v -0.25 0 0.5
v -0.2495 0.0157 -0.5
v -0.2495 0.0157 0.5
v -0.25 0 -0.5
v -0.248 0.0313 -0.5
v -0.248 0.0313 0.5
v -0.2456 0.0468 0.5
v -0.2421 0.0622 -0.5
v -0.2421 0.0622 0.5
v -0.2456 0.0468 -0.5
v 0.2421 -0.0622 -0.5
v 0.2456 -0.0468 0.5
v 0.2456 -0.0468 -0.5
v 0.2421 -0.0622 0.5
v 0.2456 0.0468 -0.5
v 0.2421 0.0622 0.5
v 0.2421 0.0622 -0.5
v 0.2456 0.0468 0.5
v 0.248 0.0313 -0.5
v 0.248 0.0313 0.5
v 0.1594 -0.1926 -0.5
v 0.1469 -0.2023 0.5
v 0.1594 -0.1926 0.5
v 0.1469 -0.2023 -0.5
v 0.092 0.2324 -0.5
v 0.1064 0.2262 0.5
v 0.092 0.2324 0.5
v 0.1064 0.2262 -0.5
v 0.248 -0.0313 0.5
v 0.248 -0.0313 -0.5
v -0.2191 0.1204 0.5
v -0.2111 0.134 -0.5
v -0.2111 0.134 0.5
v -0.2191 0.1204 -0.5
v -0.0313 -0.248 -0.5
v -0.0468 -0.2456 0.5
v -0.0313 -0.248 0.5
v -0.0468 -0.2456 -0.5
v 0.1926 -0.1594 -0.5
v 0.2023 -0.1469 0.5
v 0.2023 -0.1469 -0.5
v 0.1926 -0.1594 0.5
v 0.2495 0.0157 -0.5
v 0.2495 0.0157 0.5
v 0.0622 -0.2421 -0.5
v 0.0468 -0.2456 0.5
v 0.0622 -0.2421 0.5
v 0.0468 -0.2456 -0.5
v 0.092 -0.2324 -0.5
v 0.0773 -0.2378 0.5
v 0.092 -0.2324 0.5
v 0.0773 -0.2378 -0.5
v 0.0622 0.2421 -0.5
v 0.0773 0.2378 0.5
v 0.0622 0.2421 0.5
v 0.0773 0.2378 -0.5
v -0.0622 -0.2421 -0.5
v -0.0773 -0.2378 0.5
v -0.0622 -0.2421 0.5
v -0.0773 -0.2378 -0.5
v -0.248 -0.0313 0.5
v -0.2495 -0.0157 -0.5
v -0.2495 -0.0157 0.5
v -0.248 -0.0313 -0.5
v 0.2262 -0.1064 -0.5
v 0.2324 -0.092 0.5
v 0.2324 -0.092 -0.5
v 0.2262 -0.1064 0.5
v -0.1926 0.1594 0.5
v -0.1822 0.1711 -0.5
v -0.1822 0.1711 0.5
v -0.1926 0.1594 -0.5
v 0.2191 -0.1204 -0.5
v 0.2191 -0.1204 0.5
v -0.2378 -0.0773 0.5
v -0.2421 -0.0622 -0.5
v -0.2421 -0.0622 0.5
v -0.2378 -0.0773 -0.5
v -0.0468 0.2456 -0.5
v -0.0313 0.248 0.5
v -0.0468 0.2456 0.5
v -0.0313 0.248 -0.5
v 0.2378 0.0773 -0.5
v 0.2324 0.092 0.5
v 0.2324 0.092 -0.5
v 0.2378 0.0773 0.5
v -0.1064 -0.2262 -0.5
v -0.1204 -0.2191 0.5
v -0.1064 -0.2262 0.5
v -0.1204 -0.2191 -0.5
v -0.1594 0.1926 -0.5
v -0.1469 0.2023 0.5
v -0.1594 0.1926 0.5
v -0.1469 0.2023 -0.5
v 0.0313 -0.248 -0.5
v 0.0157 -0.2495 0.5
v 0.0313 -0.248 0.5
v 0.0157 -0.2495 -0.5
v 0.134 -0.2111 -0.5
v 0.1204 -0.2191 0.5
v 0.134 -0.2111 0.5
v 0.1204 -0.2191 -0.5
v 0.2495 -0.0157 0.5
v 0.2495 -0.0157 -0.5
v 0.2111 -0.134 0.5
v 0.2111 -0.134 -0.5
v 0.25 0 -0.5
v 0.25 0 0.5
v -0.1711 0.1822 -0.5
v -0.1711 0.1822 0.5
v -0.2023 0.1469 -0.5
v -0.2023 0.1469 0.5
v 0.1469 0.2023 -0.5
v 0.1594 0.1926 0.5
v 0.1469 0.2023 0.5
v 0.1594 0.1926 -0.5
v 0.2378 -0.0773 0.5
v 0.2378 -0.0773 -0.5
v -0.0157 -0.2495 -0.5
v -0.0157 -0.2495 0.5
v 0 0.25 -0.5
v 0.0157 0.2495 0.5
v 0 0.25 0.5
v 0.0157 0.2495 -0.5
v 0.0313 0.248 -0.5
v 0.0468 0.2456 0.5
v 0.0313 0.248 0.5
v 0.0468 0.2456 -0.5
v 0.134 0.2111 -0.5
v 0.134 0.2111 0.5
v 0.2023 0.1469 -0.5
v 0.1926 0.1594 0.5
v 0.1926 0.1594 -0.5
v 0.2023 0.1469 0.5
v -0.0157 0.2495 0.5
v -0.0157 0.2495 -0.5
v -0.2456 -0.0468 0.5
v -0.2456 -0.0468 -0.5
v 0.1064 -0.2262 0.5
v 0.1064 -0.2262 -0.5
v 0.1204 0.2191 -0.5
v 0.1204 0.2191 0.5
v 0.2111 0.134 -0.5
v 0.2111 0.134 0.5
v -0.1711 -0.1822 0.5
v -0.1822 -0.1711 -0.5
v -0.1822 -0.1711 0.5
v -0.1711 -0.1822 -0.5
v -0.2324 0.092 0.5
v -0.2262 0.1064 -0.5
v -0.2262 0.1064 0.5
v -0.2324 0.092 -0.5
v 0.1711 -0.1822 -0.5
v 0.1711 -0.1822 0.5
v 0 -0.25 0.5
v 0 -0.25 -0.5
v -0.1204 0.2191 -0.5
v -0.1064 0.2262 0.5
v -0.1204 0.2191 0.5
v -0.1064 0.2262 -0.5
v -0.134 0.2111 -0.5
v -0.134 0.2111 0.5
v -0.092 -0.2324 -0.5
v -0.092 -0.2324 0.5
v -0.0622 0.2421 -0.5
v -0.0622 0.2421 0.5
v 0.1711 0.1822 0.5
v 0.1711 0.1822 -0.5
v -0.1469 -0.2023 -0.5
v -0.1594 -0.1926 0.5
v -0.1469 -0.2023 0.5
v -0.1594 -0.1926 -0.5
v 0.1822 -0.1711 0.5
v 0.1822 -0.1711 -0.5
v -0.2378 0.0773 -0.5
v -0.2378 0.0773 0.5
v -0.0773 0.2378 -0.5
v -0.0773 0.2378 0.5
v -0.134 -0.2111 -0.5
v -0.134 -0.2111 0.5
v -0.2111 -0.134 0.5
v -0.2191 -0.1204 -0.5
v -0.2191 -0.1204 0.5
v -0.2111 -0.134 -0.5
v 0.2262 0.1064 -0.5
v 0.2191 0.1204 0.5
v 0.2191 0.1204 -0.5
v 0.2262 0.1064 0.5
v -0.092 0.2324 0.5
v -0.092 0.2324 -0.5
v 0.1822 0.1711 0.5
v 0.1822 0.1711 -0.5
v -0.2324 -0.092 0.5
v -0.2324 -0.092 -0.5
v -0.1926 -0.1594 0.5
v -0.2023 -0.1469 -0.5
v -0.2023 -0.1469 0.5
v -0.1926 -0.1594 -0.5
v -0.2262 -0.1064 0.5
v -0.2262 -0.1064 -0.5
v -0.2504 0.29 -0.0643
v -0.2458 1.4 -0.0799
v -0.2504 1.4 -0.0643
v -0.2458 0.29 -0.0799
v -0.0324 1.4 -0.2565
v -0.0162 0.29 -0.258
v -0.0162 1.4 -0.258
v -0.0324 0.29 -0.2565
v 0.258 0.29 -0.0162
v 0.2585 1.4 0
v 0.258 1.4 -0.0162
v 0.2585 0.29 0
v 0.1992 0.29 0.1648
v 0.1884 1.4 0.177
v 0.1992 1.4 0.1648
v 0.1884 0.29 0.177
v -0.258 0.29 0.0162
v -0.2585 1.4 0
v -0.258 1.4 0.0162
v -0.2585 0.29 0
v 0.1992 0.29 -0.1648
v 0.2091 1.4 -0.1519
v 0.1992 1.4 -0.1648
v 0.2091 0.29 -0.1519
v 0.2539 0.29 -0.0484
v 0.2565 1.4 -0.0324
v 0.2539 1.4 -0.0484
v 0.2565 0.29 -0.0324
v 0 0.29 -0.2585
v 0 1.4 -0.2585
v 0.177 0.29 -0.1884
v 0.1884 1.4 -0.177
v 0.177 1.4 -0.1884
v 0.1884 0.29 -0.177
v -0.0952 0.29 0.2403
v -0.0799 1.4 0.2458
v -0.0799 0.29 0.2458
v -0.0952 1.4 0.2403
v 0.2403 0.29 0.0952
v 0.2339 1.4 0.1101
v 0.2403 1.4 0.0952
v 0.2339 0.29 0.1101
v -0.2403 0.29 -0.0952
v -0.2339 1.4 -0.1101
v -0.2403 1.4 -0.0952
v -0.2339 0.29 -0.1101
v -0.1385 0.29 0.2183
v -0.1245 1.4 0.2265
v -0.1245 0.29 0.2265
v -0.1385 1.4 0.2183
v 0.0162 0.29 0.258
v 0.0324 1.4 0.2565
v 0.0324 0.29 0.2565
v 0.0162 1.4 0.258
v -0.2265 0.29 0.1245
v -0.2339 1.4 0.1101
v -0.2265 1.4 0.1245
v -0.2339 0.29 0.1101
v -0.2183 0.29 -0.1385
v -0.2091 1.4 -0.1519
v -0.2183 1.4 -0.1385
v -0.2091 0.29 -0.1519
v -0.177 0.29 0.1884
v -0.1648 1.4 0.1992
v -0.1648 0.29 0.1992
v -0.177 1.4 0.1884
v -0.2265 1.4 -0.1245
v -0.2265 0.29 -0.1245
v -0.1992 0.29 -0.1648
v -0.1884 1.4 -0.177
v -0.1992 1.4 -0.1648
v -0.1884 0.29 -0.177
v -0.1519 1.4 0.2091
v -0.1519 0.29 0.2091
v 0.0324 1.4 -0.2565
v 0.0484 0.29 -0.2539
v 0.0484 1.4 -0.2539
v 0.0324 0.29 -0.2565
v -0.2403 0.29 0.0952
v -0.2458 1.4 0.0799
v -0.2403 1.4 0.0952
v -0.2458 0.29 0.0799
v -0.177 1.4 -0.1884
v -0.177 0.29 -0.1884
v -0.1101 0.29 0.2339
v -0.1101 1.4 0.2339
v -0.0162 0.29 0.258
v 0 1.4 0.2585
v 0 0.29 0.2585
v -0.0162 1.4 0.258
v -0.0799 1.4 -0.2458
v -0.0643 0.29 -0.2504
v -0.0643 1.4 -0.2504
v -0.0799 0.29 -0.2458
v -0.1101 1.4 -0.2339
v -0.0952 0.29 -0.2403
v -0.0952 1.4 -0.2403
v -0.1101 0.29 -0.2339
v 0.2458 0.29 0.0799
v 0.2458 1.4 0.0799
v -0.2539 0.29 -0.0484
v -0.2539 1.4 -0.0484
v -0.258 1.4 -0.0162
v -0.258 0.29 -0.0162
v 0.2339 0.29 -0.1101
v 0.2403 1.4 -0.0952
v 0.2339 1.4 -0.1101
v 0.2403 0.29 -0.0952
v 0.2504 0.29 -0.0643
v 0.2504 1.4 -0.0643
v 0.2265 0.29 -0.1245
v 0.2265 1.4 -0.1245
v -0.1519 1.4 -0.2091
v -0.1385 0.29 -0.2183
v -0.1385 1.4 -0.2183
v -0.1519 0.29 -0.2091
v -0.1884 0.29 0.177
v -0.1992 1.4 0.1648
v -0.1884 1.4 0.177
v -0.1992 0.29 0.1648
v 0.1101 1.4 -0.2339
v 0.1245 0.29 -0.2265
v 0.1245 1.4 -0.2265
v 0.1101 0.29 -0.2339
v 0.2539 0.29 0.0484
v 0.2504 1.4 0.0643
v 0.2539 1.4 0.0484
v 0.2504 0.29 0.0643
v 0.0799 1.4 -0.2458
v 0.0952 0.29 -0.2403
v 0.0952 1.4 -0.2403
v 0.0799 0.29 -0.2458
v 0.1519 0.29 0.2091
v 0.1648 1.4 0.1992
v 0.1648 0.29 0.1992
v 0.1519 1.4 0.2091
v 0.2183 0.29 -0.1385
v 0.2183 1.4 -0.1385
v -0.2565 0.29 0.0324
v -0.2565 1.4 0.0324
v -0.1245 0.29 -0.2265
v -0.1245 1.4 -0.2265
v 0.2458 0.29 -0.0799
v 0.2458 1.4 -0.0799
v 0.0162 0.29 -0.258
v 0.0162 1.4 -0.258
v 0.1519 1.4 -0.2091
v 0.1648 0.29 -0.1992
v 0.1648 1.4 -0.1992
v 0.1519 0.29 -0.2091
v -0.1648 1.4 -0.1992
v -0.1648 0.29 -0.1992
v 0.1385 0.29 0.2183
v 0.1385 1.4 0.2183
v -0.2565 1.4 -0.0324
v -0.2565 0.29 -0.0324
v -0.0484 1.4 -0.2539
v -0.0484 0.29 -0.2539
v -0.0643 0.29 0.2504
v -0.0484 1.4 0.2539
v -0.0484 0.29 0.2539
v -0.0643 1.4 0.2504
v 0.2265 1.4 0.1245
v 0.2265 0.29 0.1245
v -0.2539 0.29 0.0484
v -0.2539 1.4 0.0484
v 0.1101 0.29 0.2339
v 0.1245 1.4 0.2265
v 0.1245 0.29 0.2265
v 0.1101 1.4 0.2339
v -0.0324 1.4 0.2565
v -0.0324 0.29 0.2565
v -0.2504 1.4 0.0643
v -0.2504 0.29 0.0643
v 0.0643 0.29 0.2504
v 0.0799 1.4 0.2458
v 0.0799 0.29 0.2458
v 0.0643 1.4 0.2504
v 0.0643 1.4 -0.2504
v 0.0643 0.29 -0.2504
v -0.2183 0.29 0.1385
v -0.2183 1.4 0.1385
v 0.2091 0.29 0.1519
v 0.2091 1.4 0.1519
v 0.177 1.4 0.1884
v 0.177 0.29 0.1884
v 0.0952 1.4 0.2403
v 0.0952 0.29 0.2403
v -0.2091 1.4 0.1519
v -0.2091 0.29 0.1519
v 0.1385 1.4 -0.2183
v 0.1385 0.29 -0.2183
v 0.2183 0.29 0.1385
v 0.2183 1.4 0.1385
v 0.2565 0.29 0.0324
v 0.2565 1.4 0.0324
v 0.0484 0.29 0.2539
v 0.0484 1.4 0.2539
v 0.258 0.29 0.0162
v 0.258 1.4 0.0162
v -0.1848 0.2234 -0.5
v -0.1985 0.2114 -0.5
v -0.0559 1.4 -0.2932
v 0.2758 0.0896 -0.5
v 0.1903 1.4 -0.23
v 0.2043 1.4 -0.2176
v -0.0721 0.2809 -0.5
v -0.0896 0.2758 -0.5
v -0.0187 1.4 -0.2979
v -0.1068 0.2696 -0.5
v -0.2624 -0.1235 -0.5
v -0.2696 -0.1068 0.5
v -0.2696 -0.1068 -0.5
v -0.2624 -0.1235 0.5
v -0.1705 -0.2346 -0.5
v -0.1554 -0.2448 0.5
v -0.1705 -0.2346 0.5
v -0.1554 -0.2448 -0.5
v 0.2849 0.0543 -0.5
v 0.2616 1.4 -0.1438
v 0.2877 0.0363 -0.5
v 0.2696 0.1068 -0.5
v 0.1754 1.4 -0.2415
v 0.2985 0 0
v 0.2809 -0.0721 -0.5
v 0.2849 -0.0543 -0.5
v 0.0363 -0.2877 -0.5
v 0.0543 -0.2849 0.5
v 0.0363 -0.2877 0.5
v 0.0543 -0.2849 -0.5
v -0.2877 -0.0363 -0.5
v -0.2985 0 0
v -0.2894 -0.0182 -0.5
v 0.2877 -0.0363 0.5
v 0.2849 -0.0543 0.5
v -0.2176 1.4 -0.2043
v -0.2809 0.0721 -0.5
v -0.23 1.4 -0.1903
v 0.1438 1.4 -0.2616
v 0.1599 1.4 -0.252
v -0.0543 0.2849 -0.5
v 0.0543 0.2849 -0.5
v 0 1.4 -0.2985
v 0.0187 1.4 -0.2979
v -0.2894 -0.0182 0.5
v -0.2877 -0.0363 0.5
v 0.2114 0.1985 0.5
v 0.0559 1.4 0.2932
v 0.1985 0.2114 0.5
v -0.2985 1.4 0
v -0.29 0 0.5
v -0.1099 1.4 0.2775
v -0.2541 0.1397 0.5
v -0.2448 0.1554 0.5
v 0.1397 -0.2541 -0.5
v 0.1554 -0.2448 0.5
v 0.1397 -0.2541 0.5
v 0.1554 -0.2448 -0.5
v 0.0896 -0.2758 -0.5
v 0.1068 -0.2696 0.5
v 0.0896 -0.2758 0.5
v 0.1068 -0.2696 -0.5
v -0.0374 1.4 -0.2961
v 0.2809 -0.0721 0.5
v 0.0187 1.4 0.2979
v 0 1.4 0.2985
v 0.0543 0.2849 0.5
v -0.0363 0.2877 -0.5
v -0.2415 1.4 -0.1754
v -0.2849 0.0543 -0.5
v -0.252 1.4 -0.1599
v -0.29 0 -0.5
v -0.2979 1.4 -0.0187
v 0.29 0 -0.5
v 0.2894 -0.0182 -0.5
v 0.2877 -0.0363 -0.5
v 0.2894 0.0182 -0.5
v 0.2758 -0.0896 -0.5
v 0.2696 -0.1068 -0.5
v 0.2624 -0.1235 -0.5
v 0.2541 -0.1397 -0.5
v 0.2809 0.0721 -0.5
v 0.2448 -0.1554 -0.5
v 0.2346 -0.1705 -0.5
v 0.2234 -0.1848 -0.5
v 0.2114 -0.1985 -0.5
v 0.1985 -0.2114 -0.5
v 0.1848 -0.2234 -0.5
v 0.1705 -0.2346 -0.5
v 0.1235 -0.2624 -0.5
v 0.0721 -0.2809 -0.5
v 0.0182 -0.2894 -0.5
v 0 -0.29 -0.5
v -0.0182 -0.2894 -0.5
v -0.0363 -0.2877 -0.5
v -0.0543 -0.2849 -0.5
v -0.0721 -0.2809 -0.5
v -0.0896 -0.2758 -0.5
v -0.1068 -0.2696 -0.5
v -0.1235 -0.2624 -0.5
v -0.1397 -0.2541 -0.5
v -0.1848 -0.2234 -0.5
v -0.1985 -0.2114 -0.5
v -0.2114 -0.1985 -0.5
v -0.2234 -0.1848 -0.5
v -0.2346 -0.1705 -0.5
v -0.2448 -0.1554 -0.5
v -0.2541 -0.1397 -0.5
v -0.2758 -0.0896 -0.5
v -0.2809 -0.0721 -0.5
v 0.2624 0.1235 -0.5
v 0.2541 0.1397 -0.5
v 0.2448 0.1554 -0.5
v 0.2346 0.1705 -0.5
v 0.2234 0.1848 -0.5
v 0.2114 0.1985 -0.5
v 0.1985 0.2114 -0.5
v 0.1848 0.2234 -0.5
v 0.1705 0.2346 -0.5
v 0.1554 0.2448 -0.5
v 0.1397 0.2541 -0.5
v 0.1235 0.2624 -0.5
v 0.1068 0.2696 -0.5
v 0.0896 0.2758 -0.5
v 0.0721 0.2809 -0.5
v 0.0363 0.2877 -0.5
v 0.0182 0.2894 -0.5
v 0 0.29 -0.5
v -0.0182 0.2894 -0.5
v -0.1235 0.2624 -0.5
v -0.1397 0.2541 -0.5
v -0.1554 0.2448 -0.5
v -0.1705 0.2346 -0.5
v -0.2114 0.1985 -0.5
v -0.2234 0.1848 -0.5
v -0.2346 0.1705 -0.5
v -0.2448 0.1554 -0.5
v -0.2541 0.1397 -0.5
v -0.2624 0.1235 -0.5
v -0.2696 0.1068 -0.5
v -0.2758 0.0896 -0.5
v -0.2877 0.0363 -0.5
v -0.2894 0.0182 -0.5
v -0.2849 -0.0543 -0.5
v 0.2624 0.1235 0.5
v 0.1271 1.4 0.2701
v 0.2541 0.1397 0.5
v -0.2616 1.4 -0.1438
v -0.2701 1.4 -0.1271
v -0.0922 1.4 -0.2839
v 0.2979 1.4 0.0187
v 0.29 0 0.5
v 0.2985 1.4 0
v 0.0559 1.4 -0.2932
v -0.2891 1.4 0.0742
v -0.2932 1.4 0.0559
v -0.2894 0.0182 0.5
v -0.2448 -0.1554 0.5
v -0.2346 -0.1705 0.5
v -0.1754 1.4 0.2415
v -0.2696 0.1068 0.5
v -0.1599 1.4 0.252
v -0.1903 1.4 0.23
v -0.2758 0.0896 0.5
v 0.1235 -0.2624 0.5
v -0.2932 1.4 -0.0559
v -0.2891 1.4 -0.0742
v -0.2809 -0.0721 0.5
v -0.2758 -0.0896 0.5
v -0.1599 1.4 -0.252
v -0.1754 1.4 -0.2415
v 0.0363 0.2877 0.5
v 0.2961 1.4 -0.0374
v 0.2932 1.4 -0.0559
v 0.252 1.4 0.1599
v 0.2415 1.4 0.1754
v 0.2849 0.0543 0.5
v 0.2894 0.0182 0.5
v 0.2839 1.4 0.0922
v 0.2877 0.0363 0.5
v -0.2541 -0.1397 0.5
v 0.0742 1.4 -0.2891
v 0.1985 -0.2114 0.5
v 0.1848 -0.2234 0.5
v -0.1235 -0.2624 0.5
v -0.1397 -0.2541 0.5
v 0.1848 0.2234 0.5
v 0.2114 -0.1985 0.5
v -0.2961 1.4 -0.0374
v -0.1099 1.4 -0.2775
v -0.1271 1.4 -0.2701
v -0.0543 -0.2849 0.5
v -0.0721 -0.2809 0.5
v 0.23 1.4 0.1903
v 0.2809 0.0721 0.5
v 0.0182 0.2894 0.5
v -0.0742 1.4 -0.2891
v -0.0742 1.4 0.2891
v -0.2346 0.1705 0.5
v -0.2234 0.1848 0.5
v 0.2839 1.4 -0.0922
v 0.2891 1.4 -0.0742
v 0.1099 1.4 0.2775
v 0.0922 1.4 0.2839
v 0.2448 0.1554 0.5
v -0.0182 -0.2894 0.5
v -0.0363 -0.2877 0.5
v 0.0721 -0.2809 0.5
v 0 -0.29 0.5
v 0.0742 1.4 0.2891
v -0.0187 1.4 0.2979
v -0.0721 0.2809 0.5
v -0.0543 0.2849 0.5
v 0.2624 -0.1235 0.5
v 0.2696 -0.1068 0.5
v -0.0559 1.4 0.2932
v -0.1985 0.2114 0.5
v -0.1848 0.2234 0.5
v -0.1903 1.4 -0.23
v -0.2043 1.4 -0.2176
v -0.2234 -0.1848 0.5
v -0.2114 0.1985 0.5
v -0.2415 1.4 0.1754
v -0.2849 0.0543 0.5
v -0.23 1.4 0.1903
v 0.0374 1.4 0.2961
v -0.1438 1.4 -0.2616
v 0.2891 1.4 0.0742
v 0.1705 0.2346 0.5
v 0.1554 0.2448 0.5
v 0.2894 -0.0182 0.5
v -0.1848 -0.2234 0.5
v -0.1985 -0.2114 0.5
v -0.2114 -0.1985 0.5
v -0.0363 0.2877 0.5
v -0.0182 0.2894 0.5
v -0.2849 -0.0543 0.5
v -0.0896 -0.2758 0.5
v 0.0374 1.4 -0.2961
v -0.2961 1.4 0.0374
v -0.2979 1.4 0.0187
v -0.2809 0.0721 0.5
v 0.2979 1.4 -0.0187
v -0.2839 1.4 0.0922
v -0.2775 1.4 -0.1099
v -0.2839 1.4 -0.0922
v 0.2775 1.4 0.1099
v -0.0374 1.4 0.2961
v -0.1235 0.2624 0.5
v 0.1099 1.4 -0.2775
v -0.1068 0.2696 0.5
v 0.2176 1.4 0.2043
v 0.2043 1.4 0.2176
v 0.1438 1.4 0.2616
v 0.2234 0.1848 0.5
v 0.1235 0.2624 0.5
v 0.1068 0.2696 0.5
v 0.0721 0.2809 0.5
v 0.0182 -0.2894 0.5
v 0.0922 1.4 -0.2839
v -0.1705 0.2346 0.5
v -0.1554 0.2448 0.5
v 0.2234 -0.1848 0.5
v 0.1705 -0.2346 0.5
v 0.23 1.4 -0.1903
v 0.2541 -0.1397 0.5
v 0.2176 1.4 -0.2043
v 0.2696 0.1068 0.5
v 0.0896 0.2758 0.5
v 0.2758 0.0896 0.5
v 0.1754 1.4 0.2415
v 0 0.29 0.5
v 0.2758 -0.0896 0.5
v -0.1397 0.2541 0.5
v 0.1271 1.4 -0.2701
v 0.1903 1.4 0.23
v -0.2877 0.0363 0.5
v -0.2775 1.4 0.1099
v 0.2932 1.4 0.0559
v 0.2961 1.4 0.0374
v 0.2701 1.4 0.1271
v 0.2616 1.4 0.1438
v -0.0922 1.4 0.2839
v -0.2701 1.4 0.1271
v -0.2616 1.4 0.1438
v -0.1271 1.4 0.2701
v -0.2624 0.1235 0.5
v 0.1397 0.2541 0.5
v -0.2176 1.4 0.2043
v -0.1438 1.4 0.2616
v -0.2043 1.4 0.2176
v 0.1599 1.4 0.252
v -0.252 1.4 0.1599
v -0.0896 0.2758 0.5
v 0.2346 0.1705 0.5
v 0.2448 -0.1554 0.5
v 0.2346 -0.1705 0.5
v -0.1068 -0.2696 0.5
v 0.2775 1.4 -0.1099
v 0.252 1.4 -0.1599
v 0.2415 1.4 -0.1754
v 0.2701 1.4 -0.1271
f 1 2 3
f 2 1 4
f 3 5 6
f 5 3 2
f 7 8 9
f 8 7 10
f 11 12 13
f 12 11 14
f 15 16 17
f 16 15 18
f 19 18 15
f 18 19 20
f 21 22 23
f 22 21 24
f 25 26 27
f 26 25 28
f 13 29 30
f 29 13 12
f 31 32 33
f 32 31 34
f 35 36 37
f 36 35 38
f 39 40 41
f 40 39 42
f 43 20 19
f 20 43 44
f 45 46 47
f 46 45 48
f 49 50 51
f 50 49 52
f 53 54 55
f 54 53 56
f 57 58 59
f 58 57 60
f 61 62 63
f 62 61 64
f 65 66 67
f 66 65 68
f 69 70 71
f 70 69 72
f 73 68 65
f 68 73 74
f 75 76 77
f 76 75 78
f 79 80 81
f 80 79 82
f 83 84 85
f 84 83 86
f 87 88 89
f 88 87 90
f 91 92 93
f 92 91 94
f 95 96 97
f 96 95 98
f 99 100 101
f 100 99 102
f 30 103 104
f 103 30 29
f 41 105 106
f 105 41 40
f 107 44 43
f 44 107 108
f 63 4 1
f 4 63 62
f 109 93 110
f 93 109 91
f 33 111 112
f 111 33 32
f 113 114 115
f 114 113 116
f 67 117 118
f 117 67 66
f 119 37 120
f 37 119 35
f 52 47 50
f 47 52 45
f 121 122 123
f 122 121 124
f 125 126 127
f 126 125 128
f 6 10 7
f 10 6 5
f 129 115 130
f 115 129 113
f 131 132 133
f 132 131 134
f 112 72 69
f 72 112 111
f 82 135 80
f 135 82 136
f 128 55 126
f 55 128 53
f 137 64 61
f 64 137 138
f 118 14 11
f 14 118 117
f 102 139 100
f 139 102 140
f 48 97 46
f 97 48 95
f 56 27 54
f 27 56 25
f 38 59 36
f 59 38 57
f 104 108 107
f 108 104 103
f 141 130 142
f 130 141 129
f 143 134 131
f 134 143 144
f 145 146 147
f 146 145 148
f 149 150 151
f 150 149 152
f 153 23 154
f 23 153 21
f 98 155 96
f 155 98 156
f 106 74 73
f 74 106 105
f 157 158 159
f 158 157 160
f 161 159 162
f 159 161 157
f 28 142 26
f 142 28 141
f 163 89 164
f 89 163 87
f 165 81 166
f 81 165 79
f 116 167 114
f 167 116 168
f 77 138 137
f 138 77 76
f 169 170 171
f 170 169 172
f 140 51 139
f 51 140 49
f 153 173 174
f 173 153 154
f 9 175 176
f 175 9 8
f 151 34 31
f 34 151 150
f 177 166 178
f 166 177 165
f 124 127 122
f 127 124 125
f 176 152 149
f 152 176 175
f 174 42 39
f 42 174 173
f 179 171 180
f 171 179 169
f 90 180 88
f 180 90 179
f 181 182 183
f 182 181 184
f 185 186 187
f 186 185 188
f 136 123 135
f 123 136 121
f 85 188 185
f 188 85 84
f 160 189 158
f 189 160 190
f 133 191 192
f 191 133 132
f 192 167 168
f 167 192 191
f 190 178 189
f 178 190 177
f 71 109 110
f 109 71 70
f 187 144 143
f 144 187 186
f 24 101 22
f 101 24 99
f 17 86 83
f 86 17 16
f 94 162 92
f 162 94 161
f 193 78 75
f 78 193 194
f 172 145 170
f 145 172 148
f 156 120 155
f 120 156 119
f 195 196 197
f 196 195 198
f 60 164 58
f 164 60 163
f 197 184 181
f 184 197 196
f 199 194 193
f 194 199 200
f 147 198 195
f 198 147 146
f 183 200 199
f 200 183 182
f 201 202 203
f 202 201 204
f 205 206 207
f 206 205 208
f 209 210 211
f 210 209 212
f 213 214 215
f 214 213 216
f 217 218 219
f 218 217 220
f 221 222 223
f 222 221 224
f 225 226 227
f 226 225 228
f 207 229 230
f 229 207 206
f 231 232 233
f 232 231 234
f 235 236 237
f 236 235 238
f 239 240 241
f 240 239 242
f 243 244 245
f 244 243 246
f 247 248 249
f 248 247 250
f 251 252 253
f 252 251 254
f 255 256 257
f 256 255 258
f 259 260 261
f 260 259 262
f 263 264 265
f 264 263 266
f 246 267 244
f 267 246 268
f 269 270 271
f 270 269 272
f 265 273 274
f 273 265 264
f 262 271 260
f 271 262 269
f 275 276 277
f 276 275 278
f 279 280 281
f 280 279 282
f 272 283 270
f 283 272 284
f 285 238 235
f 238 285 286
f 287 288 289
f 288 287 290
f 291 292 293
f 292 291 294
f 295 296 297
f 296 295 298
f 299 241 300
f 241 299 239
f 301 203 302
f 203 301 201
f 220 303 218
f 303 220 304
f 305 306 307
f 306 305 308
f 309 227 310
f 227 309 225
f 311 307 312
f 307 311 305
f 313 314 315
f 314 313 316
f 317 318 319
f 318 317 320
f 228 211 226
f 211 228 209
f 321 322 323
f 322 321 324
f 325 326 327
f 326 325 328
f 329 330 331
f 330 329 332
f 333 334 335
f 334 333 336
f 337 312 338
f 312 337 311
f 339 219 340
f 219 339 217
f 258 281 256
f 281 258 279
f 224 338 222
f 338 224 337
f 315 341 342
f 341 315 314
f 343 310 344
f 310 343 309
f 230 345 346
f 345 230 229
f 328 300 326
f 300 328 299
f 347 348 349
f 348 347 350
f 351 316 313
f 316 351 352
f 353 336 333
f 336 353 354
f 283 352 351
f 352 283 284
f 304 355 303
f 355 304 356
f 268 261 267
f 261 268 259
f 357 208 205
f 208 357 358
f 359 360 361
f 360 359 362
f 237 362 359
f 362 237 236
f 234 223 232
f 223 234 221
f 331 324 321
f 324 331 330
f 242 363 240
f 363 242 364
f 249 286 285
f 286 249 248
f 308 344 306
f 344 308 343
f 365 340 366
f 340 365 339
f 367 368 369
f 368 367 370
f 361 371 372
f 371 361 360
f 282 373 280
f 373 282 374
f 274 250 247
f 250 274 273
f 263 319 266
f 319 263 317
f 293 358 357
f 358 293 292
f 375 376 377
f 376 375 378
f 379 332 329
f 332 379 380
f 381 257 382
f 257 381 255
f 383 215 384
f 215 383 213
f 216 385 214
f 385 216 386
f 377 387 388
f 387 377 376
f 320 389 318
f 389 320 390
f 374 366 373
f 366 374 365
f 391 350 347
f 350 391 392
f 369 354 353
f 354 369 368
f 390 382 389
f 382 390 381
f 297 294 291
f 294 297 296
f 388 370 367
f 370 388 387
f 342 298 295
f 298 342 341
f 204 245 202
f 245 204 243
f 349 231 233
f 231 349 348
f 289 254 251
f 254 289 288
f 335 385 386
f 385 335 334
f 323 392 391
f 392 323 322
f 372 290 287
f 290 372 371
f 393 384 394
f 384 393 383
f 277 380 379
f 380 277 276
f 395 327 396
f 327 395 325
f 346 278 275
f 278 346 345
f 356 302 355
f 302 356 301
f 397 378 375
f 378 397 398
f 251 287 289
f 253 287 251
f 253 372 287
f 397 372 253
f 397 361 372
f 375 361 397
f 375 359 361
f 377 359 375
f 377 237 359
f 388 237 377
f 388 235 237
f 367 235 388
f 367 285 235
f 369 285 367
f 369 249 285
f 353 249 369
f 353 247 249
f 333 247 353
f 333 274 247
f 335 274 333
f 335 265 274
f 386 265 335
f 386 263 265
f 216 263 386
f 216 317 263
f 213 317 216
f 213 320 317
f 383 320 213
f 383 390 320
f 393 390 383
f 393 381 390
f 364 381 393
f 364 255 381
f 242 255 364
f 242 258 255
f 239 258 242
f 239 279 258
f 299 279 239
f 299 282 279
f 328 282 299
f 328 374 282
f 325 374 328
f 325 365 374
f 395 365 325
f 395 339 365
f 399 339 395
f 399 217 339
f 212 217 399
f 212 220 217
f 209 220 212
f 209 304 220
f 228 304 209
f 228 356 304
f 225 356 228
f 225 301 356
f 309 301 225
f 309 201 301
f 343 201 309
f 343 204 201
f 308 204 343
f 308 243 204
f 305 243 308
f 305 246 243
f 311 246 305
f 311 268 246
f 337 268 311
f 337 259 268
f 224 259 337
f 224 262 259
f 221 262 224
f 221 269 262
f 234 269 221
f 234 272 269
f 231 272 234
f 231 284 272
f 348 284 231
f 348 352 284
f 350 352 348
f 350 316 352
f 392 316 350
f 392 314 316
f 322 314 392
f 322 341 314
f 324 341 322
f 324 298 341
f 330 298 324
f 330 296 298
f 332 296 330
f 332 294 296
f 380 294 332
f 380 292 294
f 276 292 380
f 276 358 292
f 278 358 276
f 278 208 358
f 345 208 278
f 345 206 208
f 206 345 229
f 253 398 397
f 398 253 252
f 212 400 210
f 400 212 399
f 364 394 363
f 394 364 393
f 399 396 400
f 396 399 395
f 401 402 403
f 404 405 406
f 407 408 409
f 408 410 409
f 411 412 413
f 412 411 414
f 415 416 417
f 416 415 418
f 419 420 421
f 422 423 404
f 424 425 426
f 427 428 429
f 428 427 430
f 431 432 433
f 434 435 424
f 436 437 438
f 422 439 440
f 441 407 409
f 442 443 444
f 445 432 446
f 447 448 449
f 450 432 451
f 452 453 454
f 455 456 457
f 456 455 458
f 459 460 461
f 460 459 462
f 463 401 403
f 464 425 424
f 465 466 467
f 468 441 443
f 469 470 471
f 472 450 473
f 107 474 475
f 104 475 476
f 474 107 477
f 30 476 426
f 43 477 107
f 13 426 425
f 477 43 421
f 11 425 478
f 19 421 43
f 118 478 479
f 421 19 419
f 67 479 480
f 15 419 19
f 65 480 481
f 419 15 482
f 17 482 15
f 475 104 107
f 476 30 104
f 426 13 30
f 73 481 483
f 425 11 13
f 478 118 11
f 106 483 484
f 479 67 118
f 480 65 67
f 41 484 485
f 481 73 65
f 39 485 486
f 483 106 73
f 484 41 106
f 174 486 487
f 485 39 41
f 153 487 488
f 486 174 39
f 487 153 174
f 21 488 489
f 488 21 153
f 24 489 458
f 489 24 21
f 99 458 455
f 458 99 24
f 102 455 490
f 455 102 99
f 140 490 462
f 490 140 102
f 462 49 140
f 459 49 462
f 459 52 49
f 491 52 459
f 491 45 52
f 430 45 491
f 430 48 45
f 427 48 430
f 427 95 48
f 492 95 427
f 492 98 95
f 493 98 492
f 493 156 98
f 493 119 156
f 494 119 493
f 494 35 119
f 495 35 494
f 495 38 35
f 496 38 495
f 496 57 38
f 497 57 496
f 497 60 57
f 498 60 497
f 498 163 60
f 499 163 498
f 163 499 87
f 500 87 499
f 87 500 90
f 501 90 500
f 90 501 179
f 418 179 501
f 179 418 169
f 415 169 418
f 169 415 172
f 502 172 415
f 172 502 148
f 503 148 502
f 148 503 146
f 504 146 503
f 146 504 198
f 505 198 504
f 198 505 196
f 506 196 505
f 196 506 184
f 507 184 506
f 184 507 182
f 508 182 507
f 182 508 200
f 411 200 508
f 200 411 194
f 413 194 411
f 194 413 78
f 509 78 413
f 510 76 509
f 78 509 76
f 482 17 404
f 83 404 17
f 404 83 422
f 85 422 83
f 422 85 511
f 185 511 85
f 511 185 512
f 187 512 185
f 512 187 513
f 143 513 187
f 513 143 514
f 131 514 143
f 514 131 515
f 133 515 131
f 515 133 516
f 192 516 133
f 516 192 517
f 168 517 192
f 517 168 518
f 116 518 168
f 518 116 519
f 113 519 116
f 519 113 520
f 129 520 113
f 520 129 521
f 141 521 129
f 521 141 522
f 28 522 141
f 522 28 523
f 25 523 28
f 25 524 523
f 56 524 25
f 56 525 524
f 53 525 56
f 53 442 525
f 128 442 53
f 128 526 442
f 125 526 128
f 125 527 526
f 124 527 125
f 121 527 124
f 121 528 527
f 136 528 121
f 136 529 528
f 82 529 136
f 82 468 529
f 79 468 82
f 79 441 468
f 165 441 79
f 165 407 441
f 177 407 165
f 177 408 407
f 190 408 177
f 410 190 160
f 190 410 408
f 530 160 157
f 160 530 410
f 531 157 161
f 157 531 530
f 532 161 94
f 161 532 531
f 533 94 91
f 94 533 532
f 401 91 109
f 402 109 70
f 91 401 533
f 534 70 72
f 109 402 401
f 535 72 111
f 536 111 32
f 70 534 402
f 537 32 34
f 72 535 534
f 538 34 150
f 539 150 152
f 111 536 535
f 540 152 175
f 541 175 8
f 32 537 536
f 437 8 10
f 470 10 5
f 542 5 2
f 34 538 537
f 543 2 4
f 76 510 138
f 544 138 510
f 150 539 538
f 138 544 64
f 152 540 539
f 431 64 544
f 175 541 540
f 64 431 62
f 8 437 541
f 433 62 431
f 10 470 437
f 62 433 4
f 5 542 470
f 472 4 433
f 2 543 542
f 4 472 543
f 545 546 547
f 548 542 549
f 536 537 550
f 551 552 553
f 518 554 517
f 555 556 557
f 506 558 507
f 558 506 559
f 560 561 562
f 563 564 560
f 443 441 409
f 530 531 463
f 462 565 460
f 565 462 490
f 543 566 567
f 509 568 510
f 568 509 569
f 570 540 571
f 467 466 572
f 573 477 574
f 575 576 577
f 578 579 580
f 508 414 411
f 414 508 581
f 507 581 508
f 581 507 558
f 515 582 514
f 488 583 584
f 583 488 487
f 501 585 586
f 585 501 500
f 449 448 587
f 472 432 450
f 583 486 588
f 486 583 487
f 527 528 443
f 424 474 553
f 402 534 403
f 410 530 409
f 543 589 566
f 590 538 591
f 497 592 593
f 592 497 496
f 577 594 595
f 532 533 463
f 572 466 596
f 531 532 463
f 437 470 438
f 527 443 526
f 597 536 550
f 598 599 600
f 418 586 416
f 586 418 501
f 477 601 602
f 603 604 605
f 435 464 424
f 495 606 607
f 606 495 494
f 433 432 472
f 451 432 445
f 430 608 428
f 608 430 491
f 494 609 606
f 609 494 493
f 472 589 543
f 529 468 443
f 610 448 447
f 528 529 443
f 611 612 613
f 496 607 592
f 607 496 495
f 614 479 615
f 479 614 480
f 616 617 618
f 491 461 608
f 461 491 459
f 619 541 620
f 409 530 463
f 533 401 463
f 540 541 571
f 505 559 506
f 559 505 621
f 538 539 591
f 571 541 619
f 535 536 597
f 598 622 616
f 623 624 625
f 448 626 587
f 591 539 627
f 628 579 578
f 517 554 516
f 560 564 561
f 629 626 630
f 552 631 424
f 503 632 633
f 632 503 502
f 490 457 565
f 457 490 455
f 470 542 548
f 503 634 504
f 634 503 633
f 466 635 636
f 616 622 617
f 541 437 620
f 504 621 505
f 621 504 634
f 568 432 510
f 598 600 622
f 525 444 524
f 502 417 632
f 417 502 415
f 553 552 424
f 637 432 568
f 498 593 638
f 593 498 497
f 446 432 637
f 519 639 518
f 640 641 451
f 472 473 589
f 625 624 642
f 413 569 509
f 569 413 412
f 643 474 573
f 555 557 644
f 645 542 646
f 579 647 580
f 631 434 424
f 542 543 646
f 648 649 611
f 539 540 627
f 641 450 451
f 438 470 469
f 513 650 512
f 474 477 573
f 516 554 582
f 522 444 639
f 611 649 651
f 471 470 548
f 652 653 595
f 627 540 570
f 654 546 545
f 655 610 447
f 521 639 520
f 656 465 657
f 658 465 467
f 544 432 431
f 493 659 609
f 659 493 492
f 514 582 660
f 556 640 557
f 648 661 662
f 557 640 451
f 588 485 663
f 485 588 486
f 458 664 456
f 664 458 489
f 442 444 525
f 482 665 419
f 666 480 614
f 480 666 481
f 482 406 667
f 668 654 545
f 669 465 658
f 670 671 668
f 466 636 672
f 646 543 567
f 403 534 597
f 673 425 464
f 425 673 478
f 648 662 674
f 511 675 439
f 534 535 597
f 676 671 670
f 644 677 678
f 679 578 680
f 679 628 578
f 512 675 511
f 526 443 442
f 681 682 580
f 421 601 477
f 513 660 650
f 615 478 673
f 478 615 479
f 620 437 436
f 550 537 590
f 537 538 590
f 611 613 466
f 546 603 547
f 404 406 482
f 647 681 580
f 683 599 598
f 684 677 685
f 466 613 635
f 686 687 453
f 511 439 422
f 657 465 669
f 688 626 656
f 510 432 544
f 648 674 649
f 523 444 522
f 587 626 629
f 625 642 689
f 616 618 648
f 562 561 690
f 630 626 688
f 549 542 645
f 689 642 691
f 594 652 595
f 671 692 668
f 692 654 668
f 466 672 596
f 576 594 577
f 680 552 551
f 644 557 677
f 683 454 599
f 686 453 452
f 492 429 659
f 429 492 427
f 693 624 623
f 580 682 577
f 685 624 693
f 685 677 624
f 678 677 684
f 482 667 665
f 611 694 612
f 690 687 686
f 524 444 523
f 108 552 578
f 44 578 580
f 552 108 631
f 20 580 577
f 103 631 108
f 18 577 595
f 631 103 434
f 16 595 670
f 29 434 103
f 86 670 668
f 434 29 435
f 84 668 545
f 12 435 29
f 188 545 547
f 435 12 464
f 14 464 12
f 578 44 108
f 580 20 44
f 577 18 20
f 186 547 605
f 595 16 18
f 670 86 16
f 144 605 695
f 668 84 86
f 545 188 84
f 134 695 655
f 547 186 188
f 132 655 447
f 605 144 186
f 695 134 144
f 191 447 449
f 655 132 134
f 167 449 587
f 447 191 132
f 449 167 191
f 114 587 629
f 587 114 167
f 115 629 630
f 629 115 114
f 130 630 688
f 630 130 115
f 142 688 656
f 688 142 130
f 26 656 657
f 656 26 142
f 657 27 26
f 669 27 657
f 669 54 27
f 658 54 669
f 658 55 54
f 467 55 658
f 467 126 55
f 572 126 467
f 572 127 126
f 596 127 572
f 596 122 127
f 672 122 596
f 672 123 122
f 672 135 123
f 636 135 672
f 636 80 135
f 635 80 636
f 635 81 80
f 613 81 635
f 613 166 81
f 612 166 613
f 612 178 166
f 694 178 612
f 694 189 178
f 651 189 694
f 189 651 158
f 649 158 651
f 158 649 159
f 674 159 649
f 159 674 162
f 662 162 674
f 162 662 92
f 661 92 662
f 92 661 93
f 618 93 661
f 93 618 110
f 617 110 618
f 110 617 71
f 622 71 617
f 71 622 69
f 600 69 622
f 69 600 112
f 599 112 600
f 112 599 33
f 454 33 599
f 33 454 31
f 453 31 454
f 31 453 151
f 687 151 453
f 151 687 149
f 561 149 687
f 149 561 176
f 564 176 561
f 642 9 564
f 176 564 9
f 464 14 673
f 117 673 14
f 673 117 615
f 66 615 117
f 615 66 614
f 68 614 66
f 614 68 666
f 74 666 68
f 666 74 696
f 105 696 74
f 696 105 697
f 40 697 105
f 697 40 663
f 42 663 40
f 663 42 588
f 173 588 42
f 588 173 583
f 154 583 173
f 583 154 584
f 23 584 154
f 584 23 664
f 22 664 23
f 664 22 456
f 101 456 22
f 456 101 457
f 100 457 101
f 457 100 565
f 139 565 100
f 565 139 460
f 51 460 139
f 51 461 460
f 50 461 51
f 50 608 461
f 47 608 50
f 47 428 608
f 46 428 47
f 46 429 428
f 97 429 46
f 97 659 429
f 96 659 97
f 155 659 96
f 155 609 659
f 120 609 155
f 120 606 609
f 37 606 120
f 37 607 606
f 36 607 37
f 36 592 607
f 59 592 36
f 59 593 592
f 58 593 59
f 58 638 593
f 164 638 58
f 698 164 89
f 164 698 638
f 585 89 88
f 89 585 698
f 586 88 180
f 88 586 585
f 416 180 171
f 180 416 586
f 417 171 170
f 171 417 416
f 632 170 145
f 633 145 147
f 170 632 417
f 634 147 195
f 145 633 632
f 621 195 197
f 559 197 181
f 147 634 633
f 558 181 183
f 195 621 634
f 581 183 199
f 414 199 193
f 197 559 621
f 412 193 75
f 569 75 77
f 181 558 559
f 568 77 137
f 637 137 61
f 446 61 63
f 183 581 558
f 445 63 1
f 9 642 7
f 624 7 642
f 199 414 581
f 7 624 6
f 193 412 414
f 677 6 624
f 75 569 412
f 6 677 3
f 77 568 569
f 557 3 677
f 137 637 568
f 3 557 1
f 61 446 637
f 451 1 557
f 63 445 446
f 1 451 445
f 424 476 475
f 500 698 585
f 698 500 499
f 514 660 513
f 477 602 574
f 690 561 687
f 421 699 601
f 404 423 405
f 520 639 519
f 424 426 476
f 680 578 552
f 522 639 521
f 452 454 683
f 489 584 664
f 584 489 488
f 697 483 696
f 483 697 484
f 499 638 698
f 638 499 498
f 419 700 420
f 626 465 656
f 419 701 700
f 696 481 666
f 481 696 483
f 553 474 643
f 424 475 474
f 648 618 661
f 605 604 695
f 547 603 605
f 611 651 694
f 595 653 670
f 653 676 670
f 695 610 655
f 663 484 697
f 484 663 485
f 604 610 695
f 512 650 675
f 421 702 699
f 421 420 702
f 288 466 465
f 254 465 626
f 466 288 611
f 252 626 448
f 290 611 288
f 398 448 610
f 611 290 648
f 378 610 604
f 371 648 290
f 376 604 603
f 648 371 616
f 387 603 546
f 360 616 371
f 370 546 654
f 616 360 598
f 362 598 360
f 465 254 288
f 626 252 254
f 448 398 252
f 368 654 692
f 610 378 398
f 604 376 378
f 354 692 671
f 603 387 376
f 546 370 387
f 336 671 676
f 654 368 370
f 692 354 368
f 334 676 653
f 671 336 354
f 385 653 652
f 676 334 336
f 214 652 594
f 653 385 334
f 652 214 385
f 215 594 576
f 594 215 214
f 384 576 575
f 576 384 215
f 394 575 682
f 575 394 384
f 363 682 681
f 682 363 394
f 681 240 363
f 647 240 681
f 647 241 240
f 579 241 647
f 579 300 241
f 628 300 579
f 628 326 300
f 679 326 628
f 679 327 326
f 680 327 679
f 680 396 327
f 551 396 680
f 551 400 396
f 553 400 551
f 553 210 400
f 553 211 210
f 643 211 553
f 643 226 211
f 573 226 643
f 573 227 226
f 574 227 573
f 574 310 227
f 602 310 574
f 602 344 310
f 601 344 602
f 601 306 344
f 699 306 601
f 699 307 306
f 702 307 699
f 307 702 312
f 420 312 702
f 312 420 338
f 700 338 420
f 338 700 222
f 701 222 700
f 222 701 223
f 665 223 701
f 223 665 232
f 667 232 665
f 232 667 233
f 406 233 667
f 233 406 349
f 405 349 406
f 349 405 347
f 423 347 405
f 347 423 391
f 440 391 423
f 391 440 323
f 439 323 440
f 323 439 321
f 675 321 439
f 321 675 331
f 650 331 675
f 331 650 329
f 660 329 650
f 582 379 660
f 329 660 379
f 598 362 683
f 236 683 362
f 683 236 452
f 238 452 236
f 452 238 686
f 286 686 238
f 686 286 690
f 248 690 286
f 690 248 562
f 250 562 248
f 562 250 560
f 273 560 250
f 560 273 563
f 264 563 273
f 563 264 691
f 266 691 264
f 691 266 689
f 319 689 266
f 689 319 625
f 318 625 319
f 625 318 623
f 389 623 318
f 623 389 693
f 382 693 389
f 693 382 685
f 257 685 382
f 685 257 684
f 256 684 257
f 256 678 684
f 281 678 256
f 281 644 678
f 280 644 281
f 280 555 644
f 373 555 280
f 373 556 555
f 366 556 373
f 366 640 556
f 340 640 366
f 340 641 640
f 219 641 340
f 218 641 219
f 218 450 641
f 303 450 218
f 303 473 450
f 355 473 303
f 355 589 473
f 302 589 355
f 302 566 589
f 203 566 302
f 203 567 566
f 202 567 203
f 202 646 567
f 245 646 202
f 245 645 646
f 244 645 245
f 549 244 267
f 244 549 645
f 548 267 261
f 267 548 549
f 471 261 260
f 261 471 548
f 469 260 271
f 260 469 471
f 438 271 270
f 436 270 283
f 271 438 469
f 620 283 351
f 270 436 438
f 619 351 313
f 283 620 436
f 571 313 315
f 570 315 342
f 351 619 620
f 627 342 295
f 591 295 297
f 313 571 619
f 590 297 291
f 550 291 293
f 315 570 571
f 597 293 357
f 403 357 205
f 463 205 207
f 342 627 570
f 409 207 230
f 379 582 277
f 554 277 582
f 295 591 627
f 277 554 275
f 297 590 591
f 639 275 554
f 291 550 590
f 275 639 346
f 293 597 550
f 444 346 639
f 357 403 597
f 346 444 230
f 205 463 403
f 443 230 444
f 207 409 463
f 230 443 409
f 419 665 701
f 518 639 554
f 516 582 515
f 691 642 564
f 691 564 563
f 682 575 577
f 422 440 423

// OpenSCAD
resolution = 100;

thiccness = 0.04;
//for the 1 inch long piece, open on both ends
c1_inner = 0.5/2;
c1_outer = c1_inner + thiccness;
c1_len = 1;

c2_inner = 0.517/2;
c2_outer = c2_inner + thiccness;
c2_len = 1.4;

module pipe(outer,inner,length)
{
    linear_extrude(length, center = true)
        difference()
            {
                circle(r = outer, $fn = resolution, center = true);
                circle(r = inner, $fn = resolution, center = true);
            }
}

module tbone()
{
    difference(){
        hull()
        {
            pipe(c1_outer, c1_inner, c1_len);
                translate(v = [0,c2_len/2,0])
                    rotate([90,0,0])
                        pipe(c2_outer, c2_inner, c2_len);

        }
        union()
        {
            linear_extrude(c1_len+0.1, center = true)
                        circle(r = c1_inner, $fn = resolution, center = true);
            translate(v = [0,c1_outer+(c2_len),0])
                            rotate([90,0,0])
                                linear_extrude(c2_len)
                                    circle(r = c2_inner, $fn = resolution, center = true);
            
        }
        
                    }//difference
}

tbone();
